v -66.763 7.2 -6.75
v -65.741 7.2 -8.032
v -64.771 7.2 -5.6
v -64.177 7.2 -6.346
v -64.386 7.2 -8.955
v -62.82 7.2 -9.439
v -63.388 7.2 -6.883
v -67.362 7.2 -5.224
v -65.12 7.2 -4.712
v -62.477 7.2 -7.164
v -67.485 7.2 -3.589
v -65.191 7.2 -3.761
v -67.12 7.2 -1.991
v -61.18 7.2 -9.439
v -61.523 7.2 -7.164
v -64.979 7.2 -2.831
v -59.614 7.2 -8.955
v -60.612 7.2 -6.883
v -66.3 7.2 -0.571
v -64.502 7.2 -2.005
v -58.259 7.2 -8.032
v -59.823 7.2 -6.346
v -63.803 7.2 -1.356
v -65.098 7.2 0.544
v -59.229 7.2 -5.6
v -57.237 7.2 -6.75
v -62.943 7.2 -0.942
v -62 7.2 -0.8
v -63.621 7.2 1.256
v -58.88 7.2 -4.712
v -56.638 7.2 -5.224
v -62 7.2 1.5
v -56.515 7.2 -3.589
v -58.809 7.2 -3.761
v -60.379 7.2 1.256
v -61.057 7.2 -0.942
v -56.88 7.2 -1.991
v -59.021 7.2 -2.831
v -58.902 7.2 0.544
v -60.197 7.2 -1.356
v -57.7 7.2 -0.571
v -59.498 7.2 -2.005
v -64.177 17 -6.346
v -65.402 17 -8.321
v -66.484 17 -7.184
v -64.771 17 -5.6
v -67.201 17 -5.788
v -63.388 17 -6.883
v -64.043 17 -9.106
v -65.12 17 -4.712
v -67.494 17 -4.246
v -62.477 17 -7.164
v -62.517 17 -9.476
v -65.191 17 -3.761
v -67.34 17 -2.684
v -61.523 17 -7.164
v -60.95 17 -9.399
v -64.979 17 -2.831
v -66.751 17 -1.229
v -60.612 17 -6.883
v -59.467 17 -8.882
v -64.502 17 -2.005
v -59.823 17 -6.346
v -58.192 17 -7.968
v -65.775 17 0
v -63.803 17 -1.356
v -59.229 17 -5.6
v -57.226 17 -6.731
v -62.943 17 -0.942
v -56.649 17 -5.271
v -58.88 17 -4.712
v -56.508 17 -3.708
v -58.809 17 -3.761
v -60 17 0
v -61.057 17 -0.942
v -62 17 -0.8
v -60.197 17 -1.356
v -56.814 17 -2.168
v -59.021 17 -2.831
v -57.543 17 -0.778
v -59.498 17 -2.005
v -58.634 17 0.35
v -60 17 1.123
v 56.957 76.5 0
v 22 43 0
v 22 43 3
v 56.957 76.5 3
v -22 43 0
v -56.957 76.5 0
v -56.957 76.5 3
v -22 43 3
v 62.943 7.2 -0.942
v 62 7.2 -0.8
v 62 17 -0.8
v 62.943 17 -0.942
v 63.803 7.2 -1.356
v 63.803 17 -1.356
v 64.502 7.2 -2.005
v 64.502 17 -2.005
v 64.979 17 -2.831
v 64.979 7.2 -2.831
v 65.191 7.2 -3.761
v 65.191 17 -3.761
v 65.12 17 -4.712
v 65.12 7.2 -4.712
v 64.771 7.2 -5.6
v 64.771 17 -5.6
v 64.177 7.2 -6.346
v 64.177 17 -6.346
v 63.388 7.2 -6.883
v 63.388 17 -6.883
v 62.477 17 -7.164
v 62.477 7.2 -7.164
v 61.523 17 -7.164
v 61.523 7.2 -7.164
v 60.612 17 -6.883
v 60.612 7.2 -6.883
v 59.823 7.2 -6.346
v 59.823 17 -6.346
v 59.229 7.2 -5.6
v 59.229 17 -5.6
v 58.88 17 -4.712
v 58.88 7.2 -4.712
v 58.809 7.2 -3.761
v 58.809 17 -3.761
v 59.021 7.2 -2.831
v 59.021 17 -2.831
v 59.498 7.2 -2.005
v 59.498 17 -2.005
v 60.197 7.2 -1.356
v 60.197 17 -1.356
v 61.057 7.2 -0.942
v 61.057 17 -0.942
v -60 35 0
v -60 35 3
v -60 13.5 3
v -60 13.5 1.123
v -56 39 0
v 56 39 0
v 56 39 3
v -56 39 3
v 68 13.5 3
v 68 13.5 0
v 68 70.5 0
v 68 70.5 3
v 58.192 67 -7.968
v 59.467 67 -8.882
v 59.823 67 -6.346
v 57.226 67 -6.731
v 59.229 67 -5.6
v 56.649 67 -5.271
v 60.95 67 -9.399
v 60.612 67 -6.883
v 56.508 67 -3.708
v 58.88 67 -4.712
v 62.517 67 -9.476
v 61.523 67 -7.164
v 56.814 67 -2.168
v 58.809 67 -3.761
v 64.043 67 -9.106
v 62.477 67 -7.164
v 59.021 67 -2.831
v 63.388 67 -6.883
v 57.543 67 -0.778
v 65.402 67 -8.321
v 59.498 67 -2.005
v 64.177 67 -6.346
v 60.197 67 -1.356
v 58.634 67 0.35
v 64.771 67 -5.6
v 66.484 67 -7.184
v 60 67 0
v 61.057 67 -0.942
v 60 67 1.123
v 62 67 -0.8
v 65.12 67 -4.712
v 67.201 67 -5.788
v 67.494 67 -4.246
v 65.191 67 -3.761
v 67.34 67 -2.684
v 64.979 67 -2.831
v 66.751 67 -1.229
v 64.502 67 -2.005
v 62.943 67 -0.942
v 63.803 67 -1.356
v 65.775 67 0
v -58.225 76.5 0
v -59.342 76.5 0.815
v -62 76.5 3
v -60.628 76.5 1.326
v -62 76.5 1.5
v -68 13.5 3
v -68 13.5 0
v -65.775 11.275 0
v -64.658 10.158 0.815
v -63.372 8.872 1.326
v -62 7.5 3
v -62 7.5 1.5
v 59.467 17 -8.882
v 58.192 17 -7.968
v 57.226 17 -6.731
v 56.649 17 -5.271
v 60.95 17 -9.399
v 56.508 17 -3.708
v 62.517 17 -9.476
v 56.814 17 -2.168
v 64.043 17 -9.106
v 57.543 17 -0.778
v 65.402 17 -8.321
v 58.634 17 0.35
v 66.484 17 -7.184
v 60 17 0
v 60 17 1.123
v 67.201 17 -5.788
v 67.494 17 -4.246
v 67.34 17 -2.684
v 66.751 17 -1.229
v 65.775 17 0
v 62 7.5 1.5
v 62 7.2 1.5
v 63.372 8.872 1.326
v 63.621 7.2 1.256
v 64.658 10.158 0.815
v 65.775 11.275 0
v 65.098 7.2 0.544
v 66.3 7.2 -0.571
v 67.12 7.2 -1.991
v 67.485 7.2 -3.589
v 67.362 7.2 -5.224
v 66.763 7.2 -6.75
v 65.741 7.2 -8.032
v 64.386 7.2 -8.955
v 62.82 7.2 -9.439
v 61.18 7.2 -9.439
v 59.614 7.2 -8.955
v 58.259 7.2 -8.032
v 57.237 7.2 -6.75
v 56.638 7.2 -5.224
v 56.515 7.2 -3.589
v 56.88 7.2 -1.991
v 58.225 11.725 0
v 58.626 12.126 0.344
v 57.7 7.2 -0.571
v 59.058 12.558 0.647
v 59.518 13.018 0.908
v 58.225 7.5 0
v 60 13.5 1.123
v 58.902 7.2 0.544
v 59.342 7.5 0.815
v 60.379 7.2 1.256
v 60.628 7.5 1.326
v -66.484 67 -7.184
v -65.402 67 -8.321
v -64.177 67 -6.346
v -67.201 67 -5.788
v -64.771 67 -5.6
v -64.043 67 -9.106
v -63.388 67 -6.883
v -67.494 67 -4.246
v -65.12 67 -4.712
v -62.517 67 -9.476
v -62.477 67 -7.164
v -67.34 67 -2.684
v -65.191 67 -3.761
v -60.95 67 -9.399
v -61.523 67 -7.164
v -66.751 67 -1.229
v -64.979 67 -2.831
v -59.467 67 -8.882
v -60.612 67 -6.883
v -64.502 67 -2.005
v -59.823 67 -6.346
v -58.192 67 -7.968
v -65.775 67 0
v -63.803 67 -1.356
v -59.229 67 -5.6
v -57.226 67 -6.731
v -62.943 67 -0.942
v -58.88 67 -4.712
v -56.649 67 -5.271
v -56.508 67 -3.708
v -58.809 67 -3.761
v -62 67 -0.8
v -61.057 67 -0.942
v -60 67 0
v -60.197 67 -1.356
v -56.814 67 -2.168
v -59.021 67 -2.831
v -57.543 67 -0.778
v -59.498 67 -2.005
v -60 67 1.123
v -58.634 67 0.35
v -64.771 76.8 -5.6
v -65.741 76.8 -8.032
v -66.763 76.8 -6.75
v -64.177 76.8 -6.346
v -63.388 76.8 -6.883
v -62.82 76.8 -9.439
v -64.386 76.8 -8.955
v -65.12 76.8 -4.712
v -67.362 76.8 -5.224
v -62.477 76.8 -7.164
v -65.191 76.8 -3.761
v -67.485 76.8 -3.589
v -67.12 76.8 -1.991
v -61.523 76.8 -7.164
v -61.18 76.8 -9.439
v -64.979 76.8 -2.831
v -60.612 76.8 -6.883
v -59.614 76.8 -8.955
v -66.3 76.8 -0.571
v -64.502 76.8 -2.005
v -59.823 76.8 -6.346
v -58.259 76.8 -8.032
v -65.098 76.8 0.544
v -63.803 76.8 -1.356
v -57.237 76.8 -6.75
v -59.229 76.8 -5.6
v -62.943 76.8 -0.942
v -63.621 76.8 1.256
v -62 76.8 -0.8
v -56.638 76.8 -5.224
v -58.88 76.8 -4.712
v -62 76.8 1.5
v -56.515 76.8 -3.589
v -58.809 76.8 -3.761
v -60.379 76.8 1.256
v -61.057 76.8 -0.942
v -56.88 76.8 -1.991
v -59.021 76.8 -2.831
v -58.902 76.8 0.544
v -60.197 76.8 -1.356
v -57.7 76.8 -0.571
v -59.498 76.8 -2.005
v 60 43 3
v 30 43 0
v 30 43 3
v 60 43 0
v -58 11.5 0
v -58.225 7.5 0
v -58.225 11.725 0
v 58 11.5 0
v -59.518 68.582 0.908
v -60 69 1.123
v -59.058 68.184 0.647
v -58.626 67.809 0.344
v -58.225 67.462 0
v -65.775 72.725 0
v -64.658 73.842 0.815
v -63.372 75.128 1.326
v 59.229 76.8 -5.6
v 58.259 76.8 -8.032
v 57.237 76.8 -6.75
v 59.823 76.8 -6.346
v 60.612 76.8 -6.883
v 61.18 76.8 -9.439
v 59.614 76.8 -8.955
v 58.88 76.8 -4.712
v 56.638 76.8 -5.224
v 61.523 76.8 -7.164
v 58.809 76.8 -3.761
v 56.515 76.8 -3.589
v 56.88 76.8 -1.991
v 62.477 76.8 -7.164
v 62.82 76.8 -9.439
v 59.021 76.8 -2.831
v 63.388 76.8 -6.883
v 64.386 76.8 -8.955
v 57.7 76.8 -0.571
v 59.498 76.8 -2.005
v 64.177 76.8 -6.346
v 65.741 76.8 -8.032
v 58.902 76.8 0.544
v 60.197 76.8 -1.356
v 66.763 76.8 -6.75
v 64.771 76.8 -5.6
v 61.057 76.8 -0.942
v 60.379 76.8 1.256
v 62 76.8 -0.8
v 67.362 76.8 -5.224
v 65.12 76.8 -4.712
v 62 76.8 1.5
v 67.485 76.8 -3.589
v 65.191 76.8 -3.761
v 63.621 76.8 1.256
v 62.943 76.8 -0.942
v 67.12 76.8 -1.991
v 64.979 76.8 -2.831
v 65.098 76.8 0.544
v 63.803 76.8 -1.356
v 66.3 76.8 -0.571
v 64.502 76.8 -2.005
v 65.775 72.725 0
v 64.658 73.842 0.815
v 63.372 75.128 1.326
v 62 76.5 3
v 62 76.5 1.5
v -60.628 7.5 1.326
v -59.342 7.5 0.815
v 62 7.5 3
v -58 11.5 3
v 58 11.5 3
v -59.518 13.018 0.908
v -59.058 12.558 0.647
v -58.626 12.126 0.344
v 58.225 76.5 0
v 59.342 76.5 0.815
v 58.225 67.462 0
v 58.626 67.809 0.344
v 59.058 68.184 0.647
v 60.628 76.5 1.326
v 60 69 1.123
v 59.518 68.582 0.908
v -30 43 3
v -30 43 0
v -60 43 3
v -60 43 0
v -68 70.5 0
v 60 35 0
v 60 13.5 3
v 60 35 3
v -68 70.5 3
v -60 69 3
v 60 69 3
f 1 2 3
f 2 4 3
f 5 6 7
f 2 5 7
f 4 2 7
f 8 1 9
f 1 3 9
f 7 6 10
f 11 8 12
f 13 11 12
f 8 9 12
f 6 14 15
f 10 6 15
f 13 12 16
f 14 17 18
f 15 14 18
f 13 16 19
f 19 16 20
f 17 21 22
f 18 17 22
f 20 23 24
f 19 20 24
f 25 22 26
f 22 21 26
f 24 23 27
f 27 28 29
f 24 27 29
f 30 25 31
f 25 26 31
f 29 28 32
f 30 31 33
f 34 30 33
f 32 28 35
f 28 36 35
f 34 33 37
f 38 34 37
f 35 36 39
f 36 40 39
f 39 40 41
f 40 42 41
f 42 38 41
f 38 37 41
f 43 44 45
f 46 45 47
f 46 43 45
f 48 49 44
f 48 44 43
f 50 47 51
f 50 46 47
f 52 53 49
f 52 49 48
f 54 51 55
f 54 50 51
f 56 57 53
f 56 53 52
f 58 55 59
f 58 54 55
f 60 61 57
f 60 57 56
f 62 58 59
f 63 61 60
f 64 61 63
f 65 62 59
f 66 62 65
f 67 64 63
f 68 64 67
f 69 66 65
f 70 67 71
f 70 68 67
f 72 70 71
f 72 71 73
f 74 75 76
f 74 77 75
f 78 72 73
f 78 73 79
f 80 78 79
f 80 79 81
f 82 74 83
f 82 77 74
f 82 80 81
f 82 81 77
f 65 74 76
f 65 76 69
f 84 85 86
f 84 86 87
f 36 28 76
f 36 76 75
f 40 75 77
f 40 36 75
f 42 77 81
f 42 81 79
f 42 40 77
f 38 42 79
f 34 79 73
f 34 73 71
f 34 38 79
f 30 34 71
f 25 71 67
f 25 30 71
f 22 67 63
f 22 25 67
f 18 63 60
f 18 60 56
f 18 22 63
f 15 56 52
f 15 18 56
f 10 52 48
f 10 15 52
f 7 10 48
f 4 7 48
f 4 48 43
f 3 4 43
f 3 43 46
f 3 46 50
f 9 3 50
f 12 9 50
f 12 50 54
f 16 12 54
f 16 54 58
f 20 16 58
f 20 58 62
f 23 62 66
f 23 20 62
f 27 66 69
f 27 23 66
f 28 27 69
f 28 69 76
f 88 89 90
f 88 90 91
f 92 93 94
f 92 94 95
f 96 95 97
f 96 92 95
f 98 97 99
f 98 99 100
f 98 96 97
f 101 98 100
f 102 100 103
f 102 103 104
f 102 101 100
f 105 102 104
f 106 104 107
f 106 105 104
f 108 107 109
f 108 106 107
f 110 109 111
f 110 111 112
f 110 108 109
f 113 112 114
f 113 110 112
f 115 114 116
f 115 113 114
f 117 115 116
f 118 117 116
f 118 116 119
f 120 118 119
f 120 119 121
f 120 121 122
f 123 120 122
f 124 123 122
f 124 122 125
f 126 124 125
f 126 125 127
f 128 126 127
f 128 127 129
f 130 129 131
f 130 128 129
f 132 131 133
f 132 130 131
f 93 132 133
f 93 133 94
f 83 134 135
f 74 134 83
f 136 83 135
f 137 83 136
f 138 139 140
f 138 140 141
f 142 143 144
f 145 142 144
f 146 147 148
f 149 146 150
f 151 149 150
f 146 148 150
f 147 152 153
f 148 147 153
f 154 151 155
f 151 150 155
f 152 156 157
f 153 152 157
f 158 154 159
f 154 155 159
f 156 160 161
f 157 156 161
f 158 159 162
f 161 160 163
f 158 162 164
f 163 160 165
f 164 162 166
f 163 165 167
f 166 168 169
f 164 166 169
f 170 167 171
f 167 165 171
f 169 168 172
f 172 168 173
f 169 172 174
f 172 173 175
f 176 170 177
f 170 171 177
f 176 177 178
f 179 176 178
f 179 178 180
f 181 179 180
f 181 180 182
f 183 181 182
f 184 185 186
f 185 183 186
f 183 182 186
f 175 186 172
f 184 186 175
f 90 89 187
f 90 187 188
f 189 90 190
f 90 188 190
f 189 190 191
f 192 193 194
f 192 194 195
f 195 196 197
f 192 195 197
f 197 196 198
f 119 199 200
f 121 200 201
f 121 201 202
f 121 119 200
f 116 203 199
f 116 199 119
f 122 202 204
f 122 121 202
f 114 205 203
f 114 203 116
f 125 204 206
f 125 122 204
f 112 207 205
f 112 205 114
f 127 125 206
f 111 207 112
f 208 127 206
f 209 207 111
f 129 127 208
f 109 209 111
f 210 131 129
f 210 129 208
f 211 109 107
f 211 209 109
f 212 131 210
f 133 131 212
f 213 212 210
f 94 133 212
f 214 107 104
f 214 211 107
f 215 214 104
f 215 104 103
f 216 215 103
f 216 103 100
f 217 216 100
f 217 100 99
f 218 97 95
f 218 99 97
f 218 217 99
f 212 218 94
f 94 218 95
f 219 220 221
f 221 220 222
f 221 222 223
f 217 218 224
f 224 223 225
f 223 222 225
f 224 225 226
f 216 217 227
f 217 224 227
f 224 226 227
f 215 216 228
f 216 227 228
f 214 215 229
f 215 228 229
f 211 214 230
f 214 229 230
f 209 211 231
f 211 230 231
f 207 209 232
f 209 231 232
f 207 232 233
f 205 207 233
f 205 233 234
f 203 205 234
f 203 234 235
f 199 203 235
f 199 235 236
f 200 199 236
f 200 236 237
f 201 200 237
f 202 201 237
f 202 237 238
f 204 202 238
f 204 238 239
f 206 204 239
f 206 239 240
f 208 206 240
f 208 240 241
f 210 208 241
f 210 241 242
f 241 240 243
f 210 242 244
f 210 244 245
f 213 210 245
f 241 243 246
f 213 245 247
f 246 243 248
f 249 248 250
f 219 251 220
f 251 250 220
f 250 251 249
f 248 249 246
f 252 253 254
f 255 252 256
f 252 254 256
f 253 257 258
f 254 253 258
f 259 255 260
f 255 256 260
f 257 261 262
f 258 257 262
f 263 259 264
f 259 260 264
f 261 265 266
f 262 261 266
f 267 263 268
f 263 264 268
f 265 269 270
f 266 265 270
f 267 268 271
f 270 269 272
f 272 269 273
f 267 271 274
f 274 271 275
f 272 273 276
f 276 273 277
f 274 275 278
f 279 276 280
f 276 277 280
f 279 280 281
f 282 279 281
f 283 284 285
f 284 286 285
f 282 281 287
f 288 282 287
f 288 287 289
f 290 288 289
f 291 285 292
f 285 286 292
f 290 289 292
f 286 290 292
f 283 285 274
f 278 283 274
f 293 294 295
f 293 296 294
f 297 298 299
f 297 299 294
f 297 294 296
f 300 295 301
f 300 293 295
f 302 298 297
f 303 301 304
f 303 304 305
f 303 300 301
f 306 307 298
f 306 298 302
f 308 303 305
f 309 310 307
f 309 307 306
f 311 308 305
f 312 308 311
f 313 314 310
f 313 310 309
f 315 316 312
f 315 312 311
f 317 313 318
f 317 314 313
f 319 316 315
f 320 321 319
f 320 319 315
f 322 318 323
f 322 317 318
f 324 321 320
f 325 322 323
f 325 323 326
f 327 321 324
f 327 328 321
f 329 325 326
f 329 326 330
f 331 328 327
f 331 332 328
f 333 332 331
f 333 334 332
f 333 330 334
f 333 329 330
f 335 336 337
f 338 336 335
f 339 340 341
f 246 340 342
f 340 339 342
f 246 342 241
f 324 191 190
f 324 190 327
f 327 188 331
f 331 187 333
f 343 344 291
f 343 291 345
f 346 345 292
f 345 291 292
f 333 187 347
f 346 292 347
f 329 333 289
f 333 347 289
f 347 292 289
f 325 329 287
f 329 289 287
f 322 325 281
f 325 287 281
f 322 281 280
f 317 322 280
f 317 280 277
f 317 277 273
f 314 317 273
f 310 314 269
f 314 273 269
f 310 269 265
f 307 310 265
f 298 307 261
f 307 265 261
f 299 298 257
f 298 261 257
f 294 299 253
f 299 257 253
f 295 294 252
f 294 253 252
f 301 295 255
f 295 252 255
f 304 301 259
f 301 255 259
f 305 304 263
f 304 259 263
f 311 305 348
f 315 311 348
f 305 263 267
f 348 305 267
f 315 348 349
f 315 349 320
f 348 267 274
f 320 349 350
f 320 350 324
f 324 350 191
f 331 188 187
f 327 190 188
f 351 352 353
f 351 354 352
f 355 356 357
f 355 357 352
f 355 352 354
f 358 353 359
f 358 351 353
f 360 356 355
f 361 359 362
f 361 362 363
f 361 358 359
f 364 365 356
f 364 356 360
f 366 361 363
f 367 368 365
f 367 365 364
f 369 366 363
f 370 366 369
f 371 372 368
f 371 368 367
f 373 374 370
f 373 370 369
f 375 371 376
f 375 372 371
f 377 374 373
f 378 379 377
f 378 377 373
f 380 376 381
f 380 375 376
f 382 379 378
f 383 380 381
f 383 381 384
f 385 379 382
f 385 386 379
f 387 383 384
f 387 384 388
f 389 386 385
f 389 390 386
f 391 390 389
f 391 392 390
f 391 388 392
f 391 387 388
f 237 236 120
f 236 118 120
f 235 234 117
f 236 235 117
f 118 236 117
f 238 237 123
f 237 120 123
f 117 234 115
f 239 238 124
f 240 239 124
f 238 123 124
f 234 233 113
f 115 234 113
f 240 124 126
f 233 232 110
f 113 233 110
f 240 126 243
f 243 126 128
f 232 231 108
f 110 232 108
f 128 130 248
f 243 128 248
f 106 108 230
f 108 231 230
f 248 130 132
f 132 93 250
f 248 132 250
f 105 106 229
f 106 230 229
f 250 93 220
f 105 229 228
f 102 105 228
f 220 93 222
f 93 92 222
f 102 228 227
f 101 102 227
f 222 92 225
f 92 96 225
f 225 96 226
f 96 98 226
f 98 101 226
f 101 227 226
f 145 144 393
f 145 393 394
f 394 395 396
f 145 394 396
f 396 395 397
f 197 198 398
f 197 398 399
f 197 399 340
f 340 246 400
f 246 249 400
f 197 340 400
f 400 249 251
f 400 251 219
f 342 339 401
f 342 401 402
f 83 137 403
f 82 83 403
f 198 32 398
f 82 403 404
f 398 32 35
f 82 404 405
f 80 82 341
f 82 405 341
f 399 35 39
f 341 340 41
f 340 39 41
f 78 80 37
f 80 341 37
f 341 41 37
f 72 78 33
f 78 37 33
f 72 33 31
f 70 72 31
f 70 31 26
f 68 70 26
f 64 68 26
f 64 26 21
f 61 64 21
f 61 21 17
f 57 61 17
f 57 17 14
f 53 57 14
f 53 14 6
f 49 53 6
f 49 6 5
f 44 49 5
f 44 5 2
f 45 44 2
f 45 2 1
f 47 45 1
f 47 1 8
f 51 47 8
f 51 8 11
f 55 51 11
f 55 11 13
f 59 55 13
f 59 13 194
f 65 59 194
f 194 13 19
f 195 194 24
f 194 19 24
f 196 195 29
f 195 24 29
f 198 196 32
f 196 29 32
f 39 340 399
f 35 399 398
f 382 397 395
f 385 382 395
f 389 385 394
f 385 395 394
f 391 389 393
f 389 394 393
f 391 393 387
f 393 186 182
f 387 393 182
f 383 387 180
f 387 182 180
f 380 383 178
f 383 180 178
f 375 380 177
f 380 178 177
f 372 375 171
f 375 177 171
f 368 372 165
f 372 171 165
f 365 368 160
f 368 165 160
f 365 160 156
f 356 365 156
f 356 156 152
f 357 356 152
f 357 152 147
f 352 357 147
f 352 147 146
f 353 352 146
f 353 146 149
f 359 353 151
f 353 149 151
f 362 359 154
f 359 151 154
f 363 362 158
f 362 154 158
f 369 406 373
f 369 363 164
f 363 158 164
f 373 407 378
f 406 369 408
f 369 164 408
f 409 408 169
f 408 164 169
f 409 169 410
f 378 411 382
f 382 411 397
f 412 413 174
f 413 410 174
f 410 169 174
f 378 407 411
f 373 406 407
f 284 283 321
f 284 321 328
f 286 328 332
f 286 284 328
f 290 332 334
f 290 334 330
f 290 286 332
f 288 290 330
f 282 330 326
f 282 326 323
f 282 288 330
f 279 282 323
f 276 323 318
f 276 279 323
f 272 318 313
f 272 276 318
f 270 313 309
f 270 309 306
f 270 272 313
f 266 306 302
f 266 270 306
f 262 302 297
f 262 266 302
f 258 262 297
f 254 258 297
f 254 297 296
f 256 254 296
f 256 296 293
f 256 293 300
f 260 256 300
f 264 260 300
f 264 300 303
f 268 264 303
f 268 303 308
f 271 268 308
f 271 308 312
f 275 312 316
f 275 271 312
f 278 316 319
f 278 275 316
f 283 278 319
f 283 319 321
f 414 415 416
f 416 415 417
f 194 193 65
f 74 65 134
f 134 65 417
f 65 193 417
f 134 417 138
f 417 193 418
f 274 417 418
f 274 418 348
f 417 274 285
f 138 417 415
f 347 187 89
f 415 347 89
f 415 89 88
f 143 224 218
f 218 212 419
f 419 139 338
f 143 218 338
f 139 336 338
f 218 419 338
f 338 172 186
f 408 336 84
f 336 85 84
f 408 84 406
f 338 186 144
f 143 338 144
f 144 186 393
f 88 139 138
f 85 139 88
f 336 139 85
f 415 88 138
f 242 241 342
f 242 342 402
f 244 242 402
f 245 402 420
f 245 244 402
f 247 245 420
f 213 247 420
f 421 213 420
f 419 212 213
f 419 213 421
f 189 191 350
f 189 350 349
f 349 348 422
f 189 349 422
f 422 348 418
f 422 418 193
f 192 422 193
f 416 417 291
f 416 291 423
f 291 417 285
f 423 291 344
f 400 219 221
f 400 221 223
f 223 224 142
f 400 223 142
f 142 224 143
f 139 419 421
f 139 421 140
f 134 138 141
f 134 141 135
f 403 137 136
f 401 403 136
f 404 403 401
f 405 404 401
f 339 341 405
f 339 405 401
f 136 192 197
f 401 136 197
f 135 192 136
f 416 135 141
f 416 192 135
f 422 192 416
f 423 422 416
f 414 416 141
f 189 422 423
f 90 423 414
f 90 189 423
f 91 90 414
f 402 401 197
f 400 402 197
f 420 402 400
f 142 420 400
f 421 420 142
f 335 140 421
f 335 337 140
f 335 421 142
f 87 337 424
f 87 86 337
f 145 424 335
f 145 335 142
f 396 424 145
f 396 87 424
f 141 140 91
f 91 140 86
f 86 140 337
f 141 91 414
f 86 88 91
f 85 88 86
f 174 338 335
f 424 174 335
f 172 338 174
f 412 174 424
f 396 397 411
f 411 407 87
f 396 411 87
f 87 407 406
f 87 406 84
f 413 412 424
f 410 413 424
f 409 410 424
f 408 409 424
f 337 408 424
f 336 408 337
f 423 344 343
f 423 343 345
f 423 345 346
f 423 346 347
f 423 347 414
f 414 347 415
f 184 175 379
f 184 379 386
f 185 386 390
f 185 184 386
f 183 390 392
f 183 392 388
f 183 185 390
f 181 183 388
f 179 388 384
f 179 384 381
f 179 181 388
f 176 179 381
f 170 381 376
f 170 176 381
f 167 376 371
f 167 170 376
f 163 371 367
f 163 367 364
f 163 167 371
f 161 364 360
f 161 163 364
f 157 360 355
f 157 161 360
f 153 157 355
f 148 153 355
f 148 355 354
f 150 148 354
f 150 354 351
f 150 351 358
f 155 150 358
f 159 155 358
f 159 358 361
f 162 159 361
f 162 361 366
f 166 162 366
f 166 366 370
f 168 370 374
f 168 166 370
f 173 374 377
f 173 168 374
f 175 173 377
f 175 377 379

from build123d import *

# Parameters (mm, degrees)
F_3MM_DEPTH           = 3
CUT_EXTRUDE_368_DEPTH = 3
D6P4_1_7_2_START      = 7.2
SKETCH_3_R            = 5.5
SKETCH_3_R_2          = 3.2
D6P4_1_7_2_DEPTH      = 9.8
D6P4_1_67_START       = 67
SKETCH_4_R            = 5.5
SKETCH_4_R_2          = 3.2
D6P4_1_67_DEPTH       = 9.8
SKETCH_5_R            = 5.5
SKETCH_5_R_2          = 3.2
D6P4_1_7_2_2_DEPTH    = 9.8
SKETCH_6_R            = 5.5
SKETCH_6_R_2          = 3.2
D6P4_1_67_2_DEPTH     = 9.8


with BuildPart() as part:
    # 草图1 → 斜切侧罩_3mm外壳 (new body)
    with BuildSketch(Plane.XY):
        Polygon((-62, 7.5), (62, 7.5), (68, 13.5), (68, 70.5), (62, 76.5), (-62, 76.5), (-68, 70.5), (-68, 13.5), align=None)
    extrude(amount=F_3MM_DEPTH)

    # 草图2 → Cut-Extrude 368 (cut)
    with BuildSketch(Plane.XY):
        Polygon((-58, 11.5), (58, 11.5), (60, 13.5), (60, 35), (56, 39), (-56, 39), (-60, 35), (-60, 13.5), align=None)
        Polygon((-22, 43), (22, 43), (58, 77.5), (-58, 77.5), align=None)
        Polygon((-30, 43), (-60, 43), (-60, 69), align=None)
        Polygon((30, 43), (60, 43), (60, 69), align=None)
    extrude(amount=CUT_EXTRUDE_368_DEPTH, mode=Mode.SUBTRACT)

    # 草图3 → D6p4_-1_7.2 (add)
    with BuildSketch(Plane(origin=(0, 0, 0), x_dir=(1, 0, 0), z_dir=(0, 1, 0)).offset(D6P4_1_7_2_START)):
        with Locations(Location((-62, 4, 0), (0, 0, 270))):
            Circle(SKETCH_3_R)
        with Locations(Location((-62, 4, 0), (0, 0, 270))):
            Circle(SKETCH_3_R_2, mode=Mode.SUBTRACT)
    extrude(amount=D6P4_1_7_2_DEPTH)

    # 草图4 → D6p4_-1_67 (add)
    with BuildSketch(Plane(origin=(0, 0, 0), x_dir=(1, 0, 0), z_dir=(0, 1, 0)).offset(D6P4_1_67_START)):
        with Locations(Location((-62, 4, 0), (0, 0, 270))):
            Circle(SKETCH_4_R)
        with Locations(Location((-62, 4, 0), (0, 0, 270))):
            Circle(SKETCH_4_R_2, mode=Mode.SUBTRACT)
    extrude(amount=D6P4_1_67_DEPTH)

    # 草图5 → D6p4_1_7.2 2 (add)
    with BuildSketch(Plane(origin=(0, 0, 0), x_dir=(1, 0, 0), z_dir=(0, 1, 0)).offset(D6P4_1_7_2_START)):
        with Locations(Location((62, 4, 0), (0, 0, 270))):
            Circle(SKETCH_5_R)
        with Locations(Location((62, 4, 0), (0, 0, 270))):
            Circle(SKETCH_5_R_2, mode=Mode.SUBTRACT)
    extrude(amount=D6P4_1_7_2_2_DEPTH)

    # 草图6 → D6p4_1_67 2 (add)
    with BuildSketch(Plane(origin=(0, 0, 0), x_dir=(1, 0, 0), z_dir=(0, 1, 0)).offset(D6P4_1_67_START)):
        with Locations(Location((62, 4, 0), (0, 0, 270))):
            Circle(SKETCH_6_R)
        with Locations(Location((62, 4, 0), (0, 0, 270))):
            Circle(SKETCH_6_R_2, mode=Mode.SUBTRACT)
    extrude(amount=D6P4_1_67_2_DEPTH)


solid = part.part
